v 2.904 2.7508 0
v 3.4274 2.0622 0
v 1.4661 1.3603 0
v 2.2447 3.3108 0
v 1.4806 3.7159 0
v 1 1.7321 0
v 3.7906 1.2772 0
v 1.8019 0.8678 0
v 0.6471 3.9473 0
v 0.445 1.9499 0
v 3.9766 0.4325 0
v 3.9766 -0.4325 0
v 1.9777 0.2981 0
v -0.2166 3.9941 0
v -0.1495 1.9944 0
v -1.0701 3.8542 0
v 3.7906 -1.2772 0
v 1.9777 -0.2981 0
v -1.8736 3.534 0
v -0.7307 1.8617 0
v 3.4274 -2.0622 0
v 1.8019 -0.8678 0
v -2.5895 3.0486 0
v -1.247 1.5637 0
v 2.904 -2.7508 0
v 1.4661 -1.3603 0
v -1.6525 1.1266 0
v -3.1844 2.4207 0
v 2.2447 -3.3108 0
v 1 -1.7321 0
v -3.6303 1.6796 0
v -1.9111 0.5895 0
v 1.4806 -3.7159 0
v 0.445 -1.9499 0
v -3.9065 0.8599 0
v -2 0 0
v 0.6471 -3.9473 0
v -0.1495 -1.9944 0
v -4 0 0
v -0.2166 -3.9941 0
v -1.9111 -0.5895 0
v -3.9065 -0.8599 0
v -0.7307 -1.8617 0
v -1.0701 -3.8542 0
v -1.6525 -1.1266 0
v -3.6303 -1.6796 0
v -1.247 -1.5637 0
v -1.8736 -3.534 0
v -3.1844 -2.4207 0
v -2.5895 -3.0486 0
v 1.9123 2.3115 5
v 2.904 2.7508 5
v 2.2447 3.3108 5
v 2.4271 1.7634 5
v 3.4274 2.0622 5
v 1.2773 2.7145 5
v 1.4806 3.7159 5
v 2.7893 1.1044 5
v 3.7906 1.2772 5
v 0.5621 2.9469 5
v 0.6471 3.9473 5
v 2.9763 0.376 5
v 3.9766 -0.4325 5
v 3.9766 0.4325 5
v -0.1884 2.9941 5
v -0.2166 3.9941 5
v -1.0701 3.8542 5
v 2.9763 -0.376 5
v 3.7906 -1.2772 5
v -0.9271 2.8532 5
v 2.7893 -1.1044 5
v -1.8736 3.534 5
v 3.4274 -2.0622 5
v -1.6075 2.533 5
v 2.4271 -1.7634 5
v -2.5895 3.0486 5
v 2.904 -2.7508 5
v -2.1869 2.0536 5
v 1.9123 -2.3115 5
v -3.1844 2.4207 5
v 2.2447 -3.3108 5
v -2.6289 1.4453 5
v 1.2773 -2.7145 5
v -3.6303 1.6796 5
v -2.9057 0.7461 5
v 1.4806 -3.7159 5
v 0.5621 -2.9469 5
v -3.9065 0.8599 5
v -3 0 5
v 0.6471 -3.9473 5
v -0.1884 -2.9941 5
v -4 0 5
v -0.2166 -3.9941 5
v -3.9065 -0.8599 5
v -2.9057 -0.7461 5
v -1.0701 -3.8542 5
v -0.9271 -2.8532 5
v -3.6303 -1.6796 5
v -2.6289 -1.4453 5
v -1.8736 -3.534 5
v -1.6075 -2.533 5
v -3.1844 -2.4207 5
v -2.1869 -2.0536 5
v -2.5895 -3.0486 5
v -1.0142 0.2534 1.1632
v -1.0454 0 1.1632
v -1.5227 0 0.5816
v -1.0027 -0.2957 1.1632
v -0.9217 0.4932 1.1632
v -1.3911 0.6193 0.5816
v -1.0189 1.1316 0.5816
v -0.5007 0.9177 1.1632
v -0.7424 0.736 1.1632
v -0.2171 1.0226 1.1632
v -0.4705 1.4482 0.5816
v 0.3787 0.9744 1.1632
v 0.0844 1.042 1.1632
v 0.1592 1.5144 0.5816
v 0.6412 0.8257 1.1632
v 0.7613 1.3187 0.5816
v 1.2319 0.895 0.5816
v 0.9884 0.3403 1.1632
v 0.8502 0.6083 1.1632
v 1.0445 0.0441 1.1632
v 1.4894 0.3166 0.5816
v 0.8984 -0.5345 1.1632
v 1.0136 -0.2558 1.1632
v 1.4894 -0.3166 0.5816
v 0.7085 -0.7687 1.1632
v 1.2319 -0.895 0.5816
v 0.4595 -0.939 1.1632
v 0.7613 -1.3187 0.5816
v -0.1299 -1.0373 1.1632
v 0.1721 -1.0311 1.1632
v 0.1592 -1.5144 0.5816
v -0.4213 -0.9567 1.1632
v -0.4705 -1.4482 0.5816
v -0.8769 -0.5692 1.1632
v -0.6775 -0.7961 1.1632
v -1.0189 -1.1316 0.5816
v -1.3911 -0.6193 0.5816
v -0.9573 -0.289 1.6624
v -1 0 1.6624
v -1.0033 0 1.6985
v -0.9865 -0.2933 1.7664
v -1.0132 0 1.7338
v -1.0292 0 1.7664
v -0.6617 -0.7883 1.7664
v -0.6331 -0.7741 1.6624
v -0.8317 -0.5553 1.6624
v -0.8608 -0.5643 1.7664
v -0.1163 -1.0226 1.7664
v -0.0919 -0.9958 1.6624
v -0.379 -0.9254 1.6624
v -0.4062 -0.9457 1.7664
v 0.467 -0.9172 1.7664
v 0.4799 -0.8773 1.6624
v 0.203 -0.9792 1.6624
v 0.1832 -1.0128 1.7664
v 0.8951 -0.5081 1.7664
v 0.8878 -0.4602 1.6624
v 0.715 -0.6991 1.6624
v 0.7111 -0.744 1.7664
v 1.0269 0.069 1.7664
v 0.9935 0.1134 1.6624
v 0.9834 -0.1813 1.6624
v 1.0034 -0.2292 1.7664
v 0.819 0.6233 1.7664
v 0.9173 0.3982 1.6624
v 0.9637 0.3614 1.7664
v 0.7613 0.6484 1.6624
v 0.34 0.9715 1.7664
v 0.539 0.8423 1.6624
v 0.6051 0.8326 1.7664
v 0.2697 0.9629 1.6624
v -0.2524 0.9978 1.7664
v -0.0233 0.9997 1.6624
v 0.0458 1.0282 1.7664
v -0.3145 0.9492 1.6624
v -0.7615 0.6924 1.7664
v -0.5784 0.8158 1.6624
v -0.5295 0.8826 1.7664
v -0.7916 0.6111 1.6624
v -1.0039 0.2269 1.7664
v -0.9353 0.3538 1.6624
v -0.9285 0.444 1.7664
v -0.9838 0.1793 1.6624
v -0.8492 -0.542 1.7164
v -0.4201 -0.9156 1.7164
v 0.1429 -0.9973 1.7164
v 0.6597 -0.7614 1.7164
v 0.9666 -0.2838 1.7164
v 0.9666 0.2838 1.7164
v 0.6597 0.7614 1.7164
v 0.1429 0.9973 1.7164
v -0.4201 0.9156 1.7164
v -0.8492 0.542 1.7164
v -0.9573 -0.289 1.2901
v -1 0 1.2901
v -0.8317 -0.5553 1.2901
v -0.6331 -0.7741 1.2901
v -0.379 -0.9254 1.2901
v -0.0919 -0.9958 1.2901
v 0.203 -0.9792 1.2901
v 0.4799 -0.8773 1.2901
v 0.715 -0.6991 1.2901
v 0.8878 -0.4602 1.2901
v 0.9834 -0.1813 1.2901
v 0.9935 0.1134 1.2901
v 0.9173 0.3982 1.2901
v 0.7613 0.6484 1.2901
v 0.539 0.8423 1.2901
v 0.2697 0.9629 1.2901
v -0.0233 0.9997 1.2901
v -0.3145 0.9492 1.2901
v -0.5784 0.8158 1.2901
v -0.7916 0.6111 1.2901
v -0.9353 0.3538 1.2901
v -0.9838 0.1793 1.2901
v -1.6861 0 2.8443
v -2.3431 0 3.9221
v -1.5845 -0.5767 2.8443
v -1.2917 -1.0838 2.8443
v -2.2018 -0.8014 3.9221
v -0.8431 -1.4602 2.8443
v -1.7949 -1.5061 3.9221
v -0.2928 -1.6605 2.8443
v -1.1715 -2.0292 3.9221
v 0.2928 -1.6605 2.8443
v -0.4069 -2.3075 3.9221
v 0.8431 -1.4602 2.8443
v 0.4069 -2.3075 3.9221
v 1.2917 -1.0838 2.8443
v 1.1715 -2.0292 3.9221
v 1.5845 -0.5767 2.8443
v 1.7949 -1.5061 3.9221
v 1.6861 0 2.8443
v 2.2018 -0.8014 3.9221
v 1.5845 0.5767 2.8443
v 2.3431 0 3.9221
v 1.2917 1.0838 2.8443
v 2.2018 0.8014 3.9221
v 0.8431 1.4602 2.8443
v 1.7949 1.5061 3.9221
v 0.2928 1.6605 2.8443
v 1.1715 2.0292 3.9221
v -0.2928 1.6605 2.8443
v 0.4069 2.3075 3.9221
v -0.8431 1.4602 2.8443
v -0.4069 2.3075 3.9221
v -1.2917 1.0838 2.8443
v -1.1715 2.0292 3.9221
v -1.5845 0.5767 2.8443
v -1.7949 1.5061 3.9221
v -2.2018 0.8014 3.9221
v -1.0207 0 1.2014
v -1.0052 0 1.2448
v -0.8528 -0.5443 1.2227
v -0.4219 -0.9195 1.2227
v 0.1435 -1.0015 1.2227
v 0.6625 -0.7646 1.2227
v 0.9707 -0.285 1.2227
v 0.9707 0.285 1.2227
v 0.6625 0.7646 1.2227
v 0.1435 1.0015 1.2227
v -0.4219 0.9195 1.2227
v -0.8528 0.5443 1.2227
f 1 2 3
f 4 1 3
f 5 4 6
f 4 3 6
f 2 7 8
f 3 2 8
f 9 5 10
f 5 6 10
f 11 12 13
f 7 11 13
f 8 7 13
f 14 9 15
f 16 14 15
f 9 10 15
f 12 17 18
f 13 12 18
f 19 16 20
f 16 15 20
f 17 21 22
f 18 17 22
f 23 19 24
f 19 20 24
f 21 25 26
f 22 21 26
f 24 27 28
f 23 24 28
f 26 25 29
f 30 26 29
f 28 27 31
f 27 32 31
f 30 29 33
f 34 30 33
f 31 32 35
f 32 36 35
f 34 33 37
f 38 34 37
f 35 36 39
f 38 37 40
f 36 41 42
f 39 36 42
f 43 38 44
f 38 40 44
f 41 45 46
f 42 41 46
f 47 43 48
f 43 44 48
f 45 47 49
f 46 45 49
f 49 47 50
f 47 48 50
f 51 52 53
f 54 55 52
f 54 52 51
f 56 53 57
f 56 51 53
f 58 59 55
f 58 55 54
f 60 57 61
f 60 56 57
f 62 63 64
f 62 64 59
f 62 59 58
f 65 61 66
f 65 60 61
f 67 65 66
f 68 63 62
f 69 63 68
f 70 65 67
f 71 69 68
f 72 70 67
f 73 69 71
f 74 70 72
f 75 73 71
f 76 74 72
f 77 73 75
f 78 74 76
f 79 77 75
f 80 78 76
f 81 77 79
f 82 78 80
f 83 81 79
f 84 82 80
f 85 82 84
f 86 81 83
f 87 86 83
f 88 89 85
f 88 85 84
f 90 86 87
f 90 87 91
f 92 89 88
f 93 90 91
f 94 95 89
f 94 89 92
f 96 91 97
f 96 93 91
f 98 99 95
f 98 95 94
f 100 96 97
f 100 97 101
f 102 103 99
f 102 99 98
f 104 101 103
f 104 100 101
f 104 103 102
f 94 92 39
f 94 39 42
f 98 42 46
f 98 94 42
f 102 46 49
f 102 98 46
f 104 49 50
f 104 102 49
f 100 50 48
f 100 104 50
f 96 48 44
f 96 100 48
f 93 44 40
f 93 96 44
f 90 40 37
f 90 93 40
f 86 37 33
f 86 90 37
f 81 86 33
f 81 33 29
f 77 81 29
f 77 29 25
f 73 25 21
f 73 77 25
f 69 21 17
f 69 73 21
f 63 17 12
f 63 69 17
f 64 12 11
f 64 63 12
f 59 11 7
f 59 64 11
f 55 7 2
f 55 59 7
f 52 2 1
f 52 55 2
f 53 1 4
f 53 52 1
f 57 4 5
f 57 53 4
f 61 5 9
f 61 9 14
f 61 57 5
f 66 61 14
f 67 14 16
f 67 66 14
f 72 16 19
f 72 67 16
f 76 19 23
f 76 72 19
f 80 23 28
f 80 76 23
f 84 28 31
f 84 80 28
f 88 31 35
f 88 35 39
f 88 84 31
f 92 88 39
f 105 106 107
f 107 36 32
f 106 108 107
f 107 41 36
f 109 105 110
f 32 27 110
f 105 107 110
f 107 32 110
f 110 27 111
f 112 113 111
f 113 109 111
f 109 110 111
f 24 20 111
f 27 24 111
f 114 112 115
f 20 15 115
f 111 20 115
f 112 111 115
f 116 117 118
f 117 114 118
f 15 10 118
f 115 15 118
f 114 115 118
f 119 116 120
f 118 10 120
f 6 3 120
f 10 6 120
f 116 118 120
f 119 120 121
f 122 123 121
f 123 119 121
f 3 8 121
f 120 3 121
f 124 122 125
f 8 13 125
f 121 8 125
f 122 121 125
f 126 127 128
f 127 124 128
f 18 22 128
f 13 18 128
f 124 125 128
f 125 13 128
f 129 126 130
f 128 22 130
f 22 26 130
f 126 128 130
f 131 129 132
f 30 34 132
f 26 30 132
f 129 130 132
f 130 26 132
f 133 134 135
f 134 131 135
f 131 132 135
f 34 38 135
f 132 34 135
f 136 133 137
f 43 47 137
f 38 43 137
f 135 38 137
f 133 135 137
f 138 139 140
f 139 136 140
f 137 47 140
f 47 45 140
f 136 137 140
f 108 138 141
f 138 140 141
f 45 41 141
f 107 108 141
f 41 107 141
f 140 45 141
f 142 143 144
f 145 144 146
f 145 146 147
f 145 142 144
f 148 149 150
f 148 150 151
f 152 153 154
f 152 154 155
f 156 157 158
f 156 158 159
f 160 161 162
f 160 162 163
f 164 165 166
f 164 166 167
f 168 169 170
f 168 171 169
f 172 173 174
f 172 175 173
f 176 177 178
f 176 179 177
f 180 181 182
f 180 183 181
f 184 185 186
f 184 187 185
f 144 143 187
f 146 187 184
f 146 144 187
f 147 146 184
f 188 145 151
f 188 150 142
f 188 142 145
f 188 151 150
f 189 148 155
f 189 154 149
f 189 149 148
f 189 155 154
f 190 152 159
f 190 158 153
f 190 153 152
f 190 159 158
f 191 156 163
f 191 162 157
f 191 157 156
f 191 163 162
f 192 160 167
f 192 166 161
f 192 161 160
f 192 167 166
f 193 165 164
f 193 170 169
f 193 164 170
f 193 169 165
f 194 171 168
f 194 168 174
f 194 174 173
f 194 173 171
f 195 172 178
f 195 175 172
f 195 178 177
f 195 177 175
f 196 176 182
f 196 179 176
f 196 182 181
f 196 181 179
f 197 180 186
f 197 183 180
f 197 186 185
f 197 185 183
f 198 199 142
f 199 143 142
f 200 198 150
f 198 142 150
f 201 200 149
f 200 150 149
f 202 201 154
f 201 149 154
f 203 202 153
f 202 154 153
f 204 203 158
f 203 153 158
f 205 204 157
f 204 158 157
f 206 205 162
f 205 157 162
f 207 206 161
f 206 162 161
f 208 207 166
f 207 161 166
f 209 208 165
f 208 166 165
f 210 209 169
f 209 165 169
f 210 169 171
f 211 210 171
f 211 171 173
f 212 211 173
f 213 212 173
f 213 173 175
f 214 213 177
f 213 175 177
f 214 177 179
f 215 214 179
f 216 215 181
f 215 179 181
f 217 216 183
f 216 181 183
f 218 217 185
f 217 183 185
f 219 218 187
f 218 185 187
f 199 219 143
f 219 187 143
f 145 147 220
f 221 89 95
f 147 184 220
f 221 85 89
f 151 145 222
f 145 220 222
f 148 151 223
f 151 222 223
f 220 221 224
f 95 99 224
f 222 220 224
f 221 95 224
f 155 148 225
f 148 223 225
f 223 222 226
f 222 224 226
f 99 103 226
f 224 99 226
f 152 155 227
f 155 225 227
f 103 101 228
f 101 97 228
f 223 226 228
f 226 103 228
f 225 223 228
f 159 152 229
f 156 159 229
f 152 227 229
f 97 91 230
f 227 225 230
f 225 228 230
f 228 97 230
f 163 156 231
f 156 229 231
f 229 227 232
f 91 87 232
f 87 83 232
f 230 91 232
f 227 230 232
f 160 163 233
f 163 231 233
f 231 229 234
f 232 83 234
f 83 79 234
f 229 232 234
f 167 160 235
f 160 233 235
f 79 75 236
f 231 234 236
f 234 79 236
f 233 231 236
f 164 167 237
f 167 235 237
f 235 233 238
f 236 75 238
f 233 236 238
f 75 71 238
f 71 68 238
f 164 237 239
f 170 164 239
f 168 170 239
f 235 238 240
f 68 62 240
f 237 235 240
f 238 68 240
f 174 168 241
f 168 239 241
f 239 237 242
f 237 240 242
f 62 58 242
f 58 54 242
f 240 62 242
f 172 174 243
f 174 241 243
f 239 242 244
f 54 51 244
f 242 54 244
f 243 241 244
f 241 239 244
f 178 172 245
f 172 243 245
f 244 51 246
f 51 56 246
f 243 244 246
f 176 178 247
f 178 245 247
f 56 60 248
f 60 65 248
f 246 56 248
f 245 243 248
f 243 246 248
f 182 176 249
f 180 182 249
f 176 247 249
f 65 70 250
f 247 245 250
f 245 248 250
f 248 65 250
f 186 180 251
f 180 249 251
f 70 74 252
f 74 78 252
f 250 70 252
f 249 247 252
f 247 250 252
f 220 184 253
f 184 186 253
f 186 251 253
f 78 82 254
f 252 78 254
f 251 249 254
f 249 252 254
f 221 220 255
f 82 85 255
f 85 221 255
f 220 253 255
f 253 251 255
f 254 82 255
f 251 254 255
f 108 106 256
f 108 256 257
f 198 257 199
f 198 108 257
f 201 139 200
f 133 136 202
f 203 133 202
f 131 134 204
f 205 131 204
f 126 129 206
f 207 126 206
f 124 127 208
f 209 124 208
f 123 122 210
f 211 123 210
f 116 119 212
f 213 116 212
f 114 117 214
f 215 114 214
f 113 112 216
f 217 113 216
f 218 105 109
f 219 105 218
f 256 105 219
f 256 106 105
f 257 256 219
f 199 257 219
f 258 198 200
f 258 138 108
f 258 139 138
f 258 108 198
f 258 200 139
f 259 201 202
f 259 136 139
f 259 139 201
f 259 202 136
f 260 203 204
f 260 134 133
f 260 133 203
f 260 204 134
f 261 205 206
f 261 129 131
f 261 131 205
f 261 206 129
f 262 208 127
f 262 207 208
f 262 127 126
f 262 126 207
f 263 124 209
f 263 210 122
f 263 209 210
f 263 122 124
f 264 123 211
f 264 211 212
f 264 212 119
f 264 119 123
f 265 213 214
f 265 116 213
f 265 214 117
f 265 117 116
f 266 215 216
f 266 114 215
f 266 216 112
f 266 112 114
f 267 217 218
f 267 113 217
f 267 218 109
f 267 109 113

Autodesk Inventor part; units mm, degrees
ref_plane "YZ Plane" through (0, 0, 0) normal (1, 0, 0) x (0, 1, 0)
ref_plane "XZ Plane" through (0, 0, 0) normal (0, 1, 0) x (-1, 0, 0)
ref_plane "XY Plane" through (0, 0, 0) normal (0, 0, 1) x (1, 0, 0)
sketch "Sketch2" plane through (0, 0, 0) normal (0, 1, 0) x (-1, 0, 0)
  line L0 (4, 0) -> (4, 5)
  line L1 (0, -0.9936) -> (0, 4.4305)
  line L2 (4, 5) -> (4, 0)
  line L3 (1, 1.2185) -> (1, 1.7185)
  line L4 (1, 1.2185) -> (2, 0)
  line L5 (2, 0) -> (4, 0)
  line L6 (4, 5) -> (3, 5)
  line L7 (3, 5) -> (1, 1.7185)
  point P0 (0, 0)
  dimension "d4" = 5
  dimension "d16" = 1
  dimension "d18" = 2
  dimension "d24" = 1
  dimension "d25" = 4
revolve "Revolution2" add sketch "Sketch2" angle 360 about axis through (0, 0, -0.9936) along (0, 0, 1)
fillet "Fillet3" radius 0.2 2 edges at (1, 0, 1.7185) (1, 0, 1.2185)
properties part number "nozzle_small" material "Glass"
